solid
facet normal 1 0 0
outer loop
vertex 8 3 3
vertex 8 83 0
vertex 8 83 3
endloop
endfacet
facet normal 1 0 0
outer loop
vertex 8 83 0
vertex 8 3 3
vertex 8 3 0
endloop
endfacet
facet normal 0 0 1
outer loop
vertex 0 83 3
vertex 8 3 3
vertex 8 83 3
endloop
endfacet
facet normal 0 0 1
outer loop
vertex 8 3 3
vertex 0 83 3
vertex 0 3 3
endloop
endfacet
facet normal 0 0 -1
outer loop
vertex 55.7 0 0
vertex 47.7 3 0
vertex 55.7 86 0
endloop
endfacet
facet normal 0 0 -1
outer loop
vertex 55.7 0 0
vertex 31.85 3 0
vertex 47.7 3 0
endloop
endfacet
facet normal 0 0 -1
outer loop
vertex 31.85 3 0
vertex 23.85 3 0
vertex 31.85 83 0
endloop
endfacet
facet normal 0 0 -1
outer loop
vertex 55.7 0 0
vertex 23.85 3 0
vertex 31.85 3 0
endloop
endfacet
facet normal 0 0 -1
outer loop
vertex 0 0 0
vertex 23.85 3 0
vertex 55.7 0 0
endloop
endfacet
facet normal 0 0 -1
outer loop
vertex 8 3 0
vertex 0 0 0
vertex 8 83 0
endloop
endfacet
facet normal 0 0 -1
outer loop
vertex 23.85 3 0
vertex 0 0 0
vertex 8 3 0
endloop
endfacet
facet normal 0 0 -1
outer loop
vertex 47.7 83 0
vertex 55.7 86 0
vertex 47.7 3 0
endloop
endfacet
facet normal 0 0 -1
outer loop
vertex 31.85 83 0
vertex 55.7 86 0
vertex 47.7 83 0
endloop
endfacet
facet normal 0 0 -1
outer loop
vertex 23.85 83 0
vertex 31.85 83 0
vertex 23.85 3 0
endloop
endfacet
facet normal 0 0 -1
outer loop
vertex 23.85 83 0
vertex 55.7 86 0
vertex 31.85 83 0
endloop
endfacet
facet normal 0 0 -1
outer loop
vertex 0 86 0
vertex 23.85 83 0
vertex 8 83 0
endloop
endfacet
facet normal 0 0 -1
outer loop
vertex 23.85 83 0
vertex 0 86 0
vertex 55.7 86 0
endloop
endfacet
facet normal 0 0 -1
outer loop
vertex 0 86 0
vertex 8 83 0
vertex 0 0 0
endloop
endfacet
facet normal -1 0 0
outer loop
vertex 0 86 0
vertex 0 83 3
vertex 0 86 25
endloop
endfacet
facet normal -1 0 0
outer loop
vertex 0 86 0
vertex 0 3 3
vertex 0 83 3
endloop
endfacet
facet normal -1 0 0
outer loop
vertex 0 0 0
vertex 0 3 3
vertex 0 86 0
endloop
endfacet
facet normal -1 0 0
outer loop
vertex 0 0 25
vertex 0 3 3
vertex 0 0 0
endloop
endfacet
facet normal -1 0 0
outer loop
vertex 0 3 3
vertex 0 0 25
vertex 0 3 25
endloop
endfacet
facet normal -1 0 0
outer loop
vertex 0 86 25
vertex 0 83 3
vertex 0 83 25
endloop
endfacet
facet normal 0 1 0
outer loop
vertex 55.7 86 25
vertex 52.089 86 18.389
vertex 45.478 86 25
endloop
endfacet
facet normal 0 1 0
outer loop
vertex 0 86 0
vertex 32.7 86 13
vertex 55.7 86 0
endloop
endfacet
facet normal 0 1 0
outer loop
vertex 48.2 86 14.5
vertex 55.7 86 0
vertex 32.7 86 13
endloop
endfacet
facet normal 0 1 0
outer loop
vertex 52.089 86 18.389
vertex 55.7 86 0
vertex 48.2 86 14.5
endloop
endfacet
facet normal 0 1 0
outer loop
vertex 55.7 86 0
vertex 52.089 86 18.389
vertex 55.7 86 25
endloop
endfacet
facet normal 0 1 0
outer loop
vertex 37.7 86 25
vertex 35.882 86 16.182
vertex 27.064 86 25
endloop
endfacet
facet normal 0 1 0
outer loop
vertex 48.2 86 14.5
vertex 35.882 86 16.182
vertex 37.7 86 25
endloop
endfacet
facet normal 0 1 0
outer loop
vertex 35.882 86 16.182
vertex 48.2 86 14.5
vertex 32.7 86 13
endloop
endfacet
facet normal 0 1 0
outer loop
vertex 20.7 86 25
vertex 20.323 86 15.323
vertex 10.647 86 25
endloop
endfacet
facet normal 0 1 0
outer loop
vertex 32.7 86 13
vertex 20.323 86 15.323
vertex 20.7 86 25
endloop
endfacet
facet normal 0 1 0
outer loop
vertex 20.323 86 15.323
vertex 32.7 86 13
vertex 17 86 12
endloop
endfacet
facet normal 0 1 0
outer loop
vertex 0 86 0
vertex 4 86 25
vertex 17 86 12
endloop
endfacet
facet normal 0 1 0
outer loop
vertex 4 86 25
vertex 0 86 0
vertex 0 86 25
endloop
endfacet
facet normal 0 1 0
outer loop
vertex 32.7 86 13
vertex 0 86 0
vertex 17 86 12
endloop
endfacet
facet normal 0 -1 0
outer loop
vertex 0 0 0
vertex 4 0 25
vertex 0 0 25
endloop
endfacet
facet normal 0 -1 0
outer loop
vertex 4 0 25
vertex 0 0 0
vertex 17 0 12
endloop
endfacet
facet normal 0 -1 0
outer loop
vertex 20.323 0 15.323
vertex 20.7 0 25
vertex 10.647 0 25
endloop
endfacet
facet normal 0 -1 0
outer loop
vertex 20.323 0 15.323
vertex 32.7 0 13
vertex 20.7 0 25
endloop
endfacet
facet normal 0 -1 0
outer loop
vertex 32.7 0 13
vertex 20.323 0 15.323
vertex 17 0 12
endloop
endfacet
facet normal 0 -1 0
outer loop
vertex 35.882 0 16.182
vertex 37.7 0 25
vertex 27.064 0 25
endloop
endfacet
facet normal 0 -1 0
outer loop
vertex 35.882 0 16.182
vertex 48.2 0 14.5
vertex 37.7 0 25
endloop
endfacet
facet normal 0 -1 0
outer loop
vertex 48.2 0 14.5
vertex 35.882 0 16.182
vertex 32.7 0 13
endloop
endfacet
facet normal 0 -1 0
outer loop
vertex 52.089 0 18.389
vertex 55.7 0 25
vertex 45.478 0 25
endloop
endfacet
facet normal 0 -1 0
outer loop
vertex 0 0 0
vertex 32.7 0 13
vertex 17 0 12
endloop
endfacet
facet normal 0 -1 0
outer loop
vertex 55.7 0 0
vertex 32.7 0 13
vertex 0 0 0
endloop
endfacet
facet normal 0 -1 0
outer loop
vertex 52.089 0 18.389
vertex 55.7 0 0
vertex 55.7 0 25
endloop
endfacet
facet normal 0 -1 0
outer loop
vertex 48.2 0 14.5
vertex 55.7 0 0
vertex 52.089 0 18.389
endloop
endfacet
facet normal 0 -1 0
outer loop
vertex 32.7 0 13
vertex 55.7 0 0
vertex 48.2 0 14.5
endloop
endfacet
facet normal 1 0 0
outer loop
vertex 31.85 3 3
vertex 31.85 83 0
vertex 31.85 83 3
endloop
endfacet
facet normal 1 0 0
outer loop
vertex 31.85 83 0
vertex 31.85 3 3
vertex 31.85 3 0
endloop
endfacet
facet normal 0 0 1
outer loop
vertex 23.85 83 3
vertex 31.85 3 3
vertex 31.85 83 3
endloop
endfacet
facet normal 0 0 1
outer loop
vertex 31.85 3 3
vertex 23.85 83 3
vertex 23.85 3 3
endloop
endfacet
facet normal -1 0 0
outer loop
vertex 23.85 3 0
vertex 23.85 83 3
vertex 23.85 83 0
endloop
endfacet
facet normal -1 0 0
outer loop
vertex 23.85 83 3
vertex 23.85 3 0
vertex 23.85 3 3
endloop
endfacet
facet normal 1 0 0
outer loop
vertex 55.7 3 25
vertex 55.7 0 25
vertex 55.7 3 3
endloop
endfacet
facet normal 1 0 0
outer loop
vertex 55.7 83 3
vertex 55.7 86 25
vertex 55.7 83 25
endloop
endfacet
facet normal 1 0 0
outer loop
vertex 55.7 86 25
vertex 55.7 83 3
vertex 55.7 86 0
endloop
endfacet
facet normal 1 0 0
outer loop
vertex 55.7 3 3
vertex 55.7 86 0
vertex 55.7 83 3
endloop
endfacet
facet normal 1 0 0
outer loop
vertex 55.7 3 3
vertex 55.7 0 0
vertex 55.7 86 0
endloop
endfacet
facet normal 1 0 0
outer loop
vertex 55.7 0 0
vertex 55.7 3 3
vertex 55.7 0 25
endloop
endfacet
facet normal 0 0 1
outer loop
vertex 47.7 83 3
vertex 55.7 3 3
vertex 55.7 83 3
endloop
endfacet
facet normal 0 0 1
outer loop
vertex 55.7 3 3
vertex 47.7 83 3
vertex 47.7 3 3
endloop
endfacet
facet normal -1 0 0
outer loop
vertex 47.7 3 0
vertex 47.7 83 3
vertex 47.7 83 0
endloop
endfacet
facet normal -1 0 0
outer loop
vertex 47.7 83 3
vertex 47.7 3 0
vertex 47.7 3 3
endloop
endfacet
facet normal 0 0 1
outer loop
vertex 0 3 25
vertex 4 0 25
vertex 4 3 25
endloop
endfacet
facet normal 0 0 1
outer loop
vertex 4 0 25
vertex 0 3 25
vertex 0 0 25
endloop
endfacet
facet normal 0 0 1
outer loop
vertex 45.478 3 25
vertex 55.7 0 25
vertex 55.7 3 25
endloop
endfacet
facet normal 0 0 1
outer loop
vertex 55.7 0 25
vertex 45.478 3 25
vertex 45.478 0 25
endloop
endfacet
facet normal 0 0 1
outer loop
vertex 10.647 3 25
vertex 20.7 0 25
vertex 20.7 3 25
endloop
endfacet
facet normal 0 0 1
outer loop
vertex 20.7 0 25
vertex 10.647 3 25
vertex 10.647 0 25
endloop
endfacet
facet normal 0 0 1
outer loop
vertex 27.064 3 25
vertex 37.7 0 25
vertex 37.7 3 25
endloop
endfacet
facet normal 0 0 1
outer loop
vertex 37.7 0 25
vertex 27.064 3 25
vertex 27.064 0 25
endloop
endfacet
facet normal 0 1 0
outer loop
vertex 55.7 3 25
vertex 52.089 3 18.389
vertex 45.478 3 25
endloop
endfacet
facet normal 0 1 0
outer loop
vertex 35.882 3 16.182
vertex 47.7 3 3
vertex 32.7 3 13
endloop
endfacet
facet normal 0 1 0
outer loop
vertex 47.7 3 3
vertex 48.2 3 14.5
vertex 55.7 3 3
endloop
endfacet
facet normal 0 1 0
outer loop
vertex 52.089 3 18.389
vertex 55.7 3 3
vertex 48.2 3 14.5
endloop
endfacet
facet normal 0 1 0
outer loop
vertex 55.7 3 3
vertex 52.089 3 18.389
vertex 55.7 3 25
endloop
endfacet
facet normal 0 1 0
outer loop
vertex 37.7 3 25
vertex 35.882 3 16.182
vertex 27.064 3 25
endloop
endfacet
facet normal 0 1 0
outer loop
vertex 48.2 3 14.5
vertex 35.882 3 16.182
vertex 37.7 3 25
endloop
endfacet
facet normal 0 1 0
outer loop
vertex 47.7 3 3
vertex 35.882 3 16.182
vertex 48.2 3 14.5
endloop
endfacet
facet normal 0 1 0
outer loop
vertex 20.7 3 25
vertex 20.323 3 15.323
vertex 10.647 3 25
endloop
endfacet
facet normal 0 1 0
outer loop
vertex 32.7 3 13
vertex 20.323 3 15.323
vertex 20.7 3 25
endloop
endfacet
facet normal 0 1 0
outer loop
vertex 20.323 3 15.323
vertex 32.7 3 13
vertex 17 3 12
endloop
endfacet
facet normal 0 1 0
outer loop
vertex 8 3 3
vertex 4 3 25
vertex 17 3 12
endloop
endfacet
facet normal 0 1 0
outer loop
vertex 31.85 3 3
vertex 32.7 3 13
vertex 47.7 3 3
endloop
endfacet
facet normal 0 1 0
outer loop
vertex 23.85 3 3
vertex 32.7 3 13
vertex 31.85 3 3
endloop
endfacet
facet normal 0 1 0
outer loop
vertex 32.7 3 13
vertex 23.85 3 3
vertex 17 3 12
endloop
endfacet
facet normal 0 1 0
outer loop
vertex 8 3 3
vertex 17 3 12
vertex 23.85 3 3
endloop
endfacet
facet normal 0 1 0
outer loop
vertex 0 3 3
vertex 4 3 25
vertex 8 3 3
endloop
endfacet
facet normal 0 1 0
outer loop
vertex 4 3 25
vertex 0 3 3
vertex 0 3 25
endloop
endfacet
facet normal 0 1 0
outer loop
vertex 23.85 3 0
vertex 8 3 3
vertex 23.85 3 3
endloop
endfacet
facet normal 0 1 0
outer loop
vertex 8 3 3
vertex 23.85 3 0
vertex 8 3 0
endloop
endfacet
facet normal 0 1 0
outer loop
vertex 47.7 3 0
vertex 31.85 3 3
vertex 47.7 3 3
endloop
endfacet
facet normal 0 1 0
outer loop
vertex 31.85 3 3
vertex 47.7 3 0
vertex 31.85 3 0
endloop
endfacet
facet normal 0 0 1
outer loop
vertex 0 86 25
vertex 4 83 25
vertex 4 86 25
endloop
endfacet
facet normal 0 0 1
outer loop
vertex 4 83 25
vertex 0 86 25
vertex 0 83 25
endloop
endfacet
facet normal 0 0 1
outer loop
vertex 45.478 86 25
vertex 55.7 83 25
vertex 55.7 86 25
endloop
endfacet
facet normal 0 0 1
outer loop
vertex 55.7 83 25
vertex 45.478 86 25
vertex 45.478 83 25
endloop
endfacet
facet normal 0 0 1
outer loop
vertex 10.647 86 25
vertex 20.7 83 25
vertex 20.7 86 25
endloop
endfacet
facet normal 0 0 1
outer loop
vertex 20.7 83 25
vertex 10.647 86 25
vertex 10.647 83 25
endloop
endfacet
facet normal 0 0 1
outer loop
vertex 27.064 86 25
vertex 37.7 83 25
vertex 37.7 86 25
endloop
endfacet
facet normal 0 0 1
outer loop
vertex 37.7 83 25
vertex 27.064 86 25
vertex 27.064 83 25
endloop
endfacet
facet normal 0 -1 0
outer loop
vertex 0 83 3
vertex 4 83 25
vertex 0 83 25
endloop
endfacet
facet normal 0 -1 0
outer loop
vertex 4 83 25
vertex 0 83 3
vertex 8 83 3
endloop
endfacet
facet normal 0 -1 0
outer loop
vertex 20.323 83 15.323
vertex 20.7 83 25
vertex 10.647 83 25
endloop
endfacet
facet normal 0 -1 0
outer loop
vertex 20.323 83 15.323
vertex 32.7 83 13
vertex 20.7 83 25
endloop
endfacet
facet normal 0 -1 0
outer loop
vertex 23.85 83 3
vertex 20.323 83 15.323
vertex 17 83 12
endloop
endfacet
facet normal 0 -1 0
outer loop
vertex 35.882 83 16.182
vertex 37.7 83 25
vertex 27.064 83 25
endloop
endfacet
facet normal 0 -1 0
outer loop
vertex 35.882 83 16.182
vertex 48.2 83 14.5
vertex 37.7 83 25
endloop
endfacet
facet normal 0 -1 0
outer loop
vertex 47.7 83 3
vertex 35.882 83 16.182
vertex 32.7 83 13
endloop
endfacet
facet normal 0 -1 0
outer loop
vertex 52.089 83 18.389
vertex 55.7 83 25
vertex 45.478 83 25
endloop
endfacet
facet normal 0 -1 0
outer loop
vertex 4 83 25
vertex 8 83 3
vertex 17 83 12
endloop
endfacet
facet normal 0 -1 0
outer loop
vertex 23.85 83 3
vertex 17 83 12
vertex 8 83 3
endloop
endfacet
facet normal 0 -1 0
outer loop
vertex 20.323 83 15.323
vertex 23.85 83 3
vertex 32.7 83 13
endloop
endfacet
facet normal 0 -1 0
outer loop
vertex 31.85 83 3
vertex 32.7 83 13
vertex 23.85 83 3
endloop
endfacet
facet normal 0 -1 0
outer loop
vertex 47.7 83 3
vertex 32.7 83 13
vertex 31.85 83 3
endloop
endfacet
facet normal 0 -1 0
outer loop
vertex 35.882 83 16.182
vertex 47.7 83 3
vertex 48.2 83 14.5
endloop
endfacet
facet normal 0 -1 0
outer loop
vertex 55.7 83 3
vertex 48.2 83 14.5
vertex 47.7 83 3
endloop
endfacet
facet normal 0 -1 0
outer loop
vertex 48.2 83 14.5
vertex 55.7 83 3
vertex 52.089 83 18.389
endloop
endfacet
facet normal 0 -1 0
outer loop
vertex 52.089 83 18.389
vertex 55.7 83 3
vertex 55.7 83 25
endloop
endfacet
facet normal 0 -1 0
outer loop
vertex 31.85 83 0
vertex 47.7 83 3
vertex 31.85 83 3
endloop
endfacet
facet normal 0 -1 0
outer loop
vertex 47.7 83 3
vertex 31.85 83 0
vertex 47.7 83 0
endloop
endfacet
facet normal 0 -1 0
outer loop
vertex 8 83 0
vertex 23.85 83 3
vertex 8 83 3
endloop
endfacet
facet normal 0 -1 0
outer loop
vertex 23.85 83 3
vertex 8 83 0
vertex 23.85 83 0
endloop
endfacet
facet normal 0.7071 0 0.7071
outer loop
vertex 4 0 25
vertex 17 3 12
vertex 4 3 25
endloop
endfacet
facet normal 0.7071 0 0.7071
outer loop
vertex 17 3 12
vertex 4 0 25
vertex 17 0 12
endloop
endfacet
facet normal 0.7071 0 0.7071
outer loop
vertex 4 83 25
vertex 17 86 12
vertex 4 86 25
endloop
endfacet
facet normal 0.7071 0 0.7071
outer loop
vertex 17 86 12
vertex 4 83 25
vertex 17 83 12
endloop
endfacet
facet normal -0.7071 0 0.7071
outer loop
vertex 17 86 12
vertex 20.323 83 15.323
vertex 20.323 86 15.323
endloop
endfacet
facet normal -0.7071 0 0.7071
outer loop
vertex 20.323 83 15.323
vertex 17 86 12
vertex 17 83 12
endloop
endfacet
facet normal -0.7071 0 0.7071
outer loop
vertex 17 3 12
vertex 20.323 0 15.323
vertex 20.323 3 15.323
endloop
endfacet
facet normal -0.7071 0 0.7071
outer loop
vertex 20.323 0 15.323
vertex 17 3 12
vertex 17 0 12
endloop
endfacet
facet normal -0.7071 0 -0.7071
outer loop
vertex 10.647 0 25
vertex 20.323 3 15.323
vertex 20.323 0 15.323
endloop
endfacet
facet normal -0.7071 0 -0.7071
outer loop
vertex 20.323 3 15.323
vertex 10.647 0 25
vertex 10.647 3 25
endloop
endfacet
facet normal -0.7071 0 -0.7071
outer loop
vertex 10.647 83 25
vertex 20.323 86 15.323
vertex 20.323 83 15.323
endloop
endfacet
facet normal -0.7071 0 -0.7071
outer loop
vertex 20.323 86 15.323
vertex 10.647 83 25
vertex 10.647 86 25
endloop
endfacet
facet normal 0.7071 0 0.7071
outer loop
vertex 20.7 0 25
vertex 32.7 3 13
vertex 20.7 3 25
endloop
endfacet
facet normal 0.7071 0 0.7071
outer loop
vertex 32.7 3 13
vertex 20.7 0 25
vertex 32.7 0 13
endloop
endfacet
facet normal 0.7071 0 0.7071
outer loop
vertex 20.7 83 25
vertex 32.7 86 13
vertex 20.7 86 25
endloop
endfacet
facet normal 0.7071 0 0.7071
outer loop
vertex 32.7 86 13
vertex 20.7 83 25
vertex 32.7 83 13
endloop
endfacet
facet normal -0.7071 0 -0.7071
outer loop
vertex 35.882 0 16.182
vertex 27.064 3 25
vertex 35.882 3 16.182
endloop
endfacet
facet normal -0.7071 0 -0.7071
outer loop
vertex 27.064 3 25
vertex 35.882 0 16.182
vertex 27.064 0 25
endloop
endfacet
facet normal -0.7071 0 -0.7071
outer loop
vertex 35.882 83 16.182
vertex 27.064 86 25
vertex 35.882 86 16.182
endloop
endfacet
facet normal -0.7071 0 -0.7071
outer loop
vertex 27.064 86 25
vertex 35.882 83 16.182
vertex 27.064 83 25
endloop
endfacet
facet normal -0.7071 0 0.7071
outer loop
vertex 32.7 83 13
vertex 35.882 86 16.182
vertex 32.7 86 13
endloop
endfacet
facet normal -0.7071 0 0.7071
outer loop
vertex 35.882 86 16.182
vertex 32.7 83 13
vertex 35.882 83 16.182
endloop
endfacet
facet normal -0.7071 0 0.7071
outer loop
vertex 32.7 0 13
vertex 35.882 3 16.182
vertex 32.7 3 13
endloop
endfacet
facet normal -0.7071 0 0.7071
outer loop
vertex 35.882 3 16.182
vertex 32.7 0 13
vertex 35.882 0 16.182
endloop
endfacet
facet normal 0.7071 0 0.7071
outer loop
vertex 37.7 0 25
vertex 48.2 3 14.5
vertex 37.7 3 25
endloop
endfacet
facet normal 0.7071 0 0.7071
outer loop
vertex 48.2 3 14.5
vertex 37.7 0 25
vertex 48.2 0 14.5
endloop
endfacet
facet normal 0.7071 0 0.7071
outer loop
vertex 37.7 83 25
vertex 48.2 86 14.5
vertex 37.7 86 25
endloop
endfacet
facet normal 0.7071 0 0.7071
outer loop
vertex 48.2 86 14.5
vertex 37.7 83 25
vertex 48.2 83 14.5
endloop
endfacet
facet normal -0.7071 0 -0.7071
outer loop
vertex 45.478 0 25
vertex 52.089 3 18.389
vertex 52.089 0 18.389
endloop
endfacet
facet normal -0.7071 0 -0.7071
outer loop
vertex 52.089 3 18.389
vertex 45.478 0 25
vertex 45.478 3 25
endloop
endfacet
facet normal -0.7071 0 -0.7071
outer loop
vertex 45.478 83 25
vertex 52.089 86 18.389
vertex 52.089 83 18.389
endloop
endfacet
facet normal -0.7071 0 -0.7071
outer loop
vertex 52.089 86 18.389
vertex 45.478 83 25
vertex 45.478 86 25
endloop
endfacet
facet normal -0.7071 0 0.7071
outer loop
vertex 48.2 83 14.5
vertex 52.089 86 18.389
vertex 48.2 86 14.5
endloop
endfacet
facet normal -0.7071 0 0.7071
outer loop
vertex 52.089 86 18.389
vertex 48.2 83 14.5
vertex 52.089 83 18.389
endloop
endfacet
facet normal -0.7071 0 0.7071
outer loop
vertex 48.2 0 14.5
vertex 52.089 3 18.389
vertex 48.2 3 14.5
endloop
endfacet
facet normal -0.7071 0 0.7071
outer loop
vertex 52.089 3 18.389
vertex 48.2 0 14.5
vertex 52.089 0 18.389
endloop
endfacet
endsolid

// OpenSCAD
widths        = [  4.70,  4.50,  5.50];
spacing       = [ 11,    11,    11];
pocket_depth  = [ 13,    12,    10.5];

base_width    = 86.0;
rail_width    =  3.0;
rail_height   = 25.0;
cross_height  =  3.0;
cross_bars    =  3;

function sum (v, i = 0, r = 0) = i < len (v) ? sum (v, i + 1, r + v [i]) : r;
function subarray (list, begin = 0, end = -1) = [
  let (end = end < 0 ? len (list) : end)
    for (i = [begin : 1 : end - 1])
      list [i]
];

length = sum (widths) + sum (spacing) + 8;

difference () {
  union () {
    for (i = [0 : cross_bars - 1])
      translate ([i == 0 ? 0 : ((length / (cross_bars - 1)) * i) - (i == (cross_bars - 1) ? 8 : 4), 0, 0])
        cube ([8, base_width, cross_height]);
    translate ([0, 0, 0])
      cube ([length, rail_width, rail_height]);
    translate ([0, base_width - rail_width, 0])
      cube ([length, rail_width, rail_height]);
  }

  for (i = [0 : len (widths) - 1]) {
    translate ([17 + sum (subarray (spacing, 0, i)) + sum (subarray (widths, 0, i)), -0.01, rail_height - pocket_depth [i]])
      rotate ([0, 315, 0])
        cube ([widths [i], base_width + 0.02, 25]);
  }
}
